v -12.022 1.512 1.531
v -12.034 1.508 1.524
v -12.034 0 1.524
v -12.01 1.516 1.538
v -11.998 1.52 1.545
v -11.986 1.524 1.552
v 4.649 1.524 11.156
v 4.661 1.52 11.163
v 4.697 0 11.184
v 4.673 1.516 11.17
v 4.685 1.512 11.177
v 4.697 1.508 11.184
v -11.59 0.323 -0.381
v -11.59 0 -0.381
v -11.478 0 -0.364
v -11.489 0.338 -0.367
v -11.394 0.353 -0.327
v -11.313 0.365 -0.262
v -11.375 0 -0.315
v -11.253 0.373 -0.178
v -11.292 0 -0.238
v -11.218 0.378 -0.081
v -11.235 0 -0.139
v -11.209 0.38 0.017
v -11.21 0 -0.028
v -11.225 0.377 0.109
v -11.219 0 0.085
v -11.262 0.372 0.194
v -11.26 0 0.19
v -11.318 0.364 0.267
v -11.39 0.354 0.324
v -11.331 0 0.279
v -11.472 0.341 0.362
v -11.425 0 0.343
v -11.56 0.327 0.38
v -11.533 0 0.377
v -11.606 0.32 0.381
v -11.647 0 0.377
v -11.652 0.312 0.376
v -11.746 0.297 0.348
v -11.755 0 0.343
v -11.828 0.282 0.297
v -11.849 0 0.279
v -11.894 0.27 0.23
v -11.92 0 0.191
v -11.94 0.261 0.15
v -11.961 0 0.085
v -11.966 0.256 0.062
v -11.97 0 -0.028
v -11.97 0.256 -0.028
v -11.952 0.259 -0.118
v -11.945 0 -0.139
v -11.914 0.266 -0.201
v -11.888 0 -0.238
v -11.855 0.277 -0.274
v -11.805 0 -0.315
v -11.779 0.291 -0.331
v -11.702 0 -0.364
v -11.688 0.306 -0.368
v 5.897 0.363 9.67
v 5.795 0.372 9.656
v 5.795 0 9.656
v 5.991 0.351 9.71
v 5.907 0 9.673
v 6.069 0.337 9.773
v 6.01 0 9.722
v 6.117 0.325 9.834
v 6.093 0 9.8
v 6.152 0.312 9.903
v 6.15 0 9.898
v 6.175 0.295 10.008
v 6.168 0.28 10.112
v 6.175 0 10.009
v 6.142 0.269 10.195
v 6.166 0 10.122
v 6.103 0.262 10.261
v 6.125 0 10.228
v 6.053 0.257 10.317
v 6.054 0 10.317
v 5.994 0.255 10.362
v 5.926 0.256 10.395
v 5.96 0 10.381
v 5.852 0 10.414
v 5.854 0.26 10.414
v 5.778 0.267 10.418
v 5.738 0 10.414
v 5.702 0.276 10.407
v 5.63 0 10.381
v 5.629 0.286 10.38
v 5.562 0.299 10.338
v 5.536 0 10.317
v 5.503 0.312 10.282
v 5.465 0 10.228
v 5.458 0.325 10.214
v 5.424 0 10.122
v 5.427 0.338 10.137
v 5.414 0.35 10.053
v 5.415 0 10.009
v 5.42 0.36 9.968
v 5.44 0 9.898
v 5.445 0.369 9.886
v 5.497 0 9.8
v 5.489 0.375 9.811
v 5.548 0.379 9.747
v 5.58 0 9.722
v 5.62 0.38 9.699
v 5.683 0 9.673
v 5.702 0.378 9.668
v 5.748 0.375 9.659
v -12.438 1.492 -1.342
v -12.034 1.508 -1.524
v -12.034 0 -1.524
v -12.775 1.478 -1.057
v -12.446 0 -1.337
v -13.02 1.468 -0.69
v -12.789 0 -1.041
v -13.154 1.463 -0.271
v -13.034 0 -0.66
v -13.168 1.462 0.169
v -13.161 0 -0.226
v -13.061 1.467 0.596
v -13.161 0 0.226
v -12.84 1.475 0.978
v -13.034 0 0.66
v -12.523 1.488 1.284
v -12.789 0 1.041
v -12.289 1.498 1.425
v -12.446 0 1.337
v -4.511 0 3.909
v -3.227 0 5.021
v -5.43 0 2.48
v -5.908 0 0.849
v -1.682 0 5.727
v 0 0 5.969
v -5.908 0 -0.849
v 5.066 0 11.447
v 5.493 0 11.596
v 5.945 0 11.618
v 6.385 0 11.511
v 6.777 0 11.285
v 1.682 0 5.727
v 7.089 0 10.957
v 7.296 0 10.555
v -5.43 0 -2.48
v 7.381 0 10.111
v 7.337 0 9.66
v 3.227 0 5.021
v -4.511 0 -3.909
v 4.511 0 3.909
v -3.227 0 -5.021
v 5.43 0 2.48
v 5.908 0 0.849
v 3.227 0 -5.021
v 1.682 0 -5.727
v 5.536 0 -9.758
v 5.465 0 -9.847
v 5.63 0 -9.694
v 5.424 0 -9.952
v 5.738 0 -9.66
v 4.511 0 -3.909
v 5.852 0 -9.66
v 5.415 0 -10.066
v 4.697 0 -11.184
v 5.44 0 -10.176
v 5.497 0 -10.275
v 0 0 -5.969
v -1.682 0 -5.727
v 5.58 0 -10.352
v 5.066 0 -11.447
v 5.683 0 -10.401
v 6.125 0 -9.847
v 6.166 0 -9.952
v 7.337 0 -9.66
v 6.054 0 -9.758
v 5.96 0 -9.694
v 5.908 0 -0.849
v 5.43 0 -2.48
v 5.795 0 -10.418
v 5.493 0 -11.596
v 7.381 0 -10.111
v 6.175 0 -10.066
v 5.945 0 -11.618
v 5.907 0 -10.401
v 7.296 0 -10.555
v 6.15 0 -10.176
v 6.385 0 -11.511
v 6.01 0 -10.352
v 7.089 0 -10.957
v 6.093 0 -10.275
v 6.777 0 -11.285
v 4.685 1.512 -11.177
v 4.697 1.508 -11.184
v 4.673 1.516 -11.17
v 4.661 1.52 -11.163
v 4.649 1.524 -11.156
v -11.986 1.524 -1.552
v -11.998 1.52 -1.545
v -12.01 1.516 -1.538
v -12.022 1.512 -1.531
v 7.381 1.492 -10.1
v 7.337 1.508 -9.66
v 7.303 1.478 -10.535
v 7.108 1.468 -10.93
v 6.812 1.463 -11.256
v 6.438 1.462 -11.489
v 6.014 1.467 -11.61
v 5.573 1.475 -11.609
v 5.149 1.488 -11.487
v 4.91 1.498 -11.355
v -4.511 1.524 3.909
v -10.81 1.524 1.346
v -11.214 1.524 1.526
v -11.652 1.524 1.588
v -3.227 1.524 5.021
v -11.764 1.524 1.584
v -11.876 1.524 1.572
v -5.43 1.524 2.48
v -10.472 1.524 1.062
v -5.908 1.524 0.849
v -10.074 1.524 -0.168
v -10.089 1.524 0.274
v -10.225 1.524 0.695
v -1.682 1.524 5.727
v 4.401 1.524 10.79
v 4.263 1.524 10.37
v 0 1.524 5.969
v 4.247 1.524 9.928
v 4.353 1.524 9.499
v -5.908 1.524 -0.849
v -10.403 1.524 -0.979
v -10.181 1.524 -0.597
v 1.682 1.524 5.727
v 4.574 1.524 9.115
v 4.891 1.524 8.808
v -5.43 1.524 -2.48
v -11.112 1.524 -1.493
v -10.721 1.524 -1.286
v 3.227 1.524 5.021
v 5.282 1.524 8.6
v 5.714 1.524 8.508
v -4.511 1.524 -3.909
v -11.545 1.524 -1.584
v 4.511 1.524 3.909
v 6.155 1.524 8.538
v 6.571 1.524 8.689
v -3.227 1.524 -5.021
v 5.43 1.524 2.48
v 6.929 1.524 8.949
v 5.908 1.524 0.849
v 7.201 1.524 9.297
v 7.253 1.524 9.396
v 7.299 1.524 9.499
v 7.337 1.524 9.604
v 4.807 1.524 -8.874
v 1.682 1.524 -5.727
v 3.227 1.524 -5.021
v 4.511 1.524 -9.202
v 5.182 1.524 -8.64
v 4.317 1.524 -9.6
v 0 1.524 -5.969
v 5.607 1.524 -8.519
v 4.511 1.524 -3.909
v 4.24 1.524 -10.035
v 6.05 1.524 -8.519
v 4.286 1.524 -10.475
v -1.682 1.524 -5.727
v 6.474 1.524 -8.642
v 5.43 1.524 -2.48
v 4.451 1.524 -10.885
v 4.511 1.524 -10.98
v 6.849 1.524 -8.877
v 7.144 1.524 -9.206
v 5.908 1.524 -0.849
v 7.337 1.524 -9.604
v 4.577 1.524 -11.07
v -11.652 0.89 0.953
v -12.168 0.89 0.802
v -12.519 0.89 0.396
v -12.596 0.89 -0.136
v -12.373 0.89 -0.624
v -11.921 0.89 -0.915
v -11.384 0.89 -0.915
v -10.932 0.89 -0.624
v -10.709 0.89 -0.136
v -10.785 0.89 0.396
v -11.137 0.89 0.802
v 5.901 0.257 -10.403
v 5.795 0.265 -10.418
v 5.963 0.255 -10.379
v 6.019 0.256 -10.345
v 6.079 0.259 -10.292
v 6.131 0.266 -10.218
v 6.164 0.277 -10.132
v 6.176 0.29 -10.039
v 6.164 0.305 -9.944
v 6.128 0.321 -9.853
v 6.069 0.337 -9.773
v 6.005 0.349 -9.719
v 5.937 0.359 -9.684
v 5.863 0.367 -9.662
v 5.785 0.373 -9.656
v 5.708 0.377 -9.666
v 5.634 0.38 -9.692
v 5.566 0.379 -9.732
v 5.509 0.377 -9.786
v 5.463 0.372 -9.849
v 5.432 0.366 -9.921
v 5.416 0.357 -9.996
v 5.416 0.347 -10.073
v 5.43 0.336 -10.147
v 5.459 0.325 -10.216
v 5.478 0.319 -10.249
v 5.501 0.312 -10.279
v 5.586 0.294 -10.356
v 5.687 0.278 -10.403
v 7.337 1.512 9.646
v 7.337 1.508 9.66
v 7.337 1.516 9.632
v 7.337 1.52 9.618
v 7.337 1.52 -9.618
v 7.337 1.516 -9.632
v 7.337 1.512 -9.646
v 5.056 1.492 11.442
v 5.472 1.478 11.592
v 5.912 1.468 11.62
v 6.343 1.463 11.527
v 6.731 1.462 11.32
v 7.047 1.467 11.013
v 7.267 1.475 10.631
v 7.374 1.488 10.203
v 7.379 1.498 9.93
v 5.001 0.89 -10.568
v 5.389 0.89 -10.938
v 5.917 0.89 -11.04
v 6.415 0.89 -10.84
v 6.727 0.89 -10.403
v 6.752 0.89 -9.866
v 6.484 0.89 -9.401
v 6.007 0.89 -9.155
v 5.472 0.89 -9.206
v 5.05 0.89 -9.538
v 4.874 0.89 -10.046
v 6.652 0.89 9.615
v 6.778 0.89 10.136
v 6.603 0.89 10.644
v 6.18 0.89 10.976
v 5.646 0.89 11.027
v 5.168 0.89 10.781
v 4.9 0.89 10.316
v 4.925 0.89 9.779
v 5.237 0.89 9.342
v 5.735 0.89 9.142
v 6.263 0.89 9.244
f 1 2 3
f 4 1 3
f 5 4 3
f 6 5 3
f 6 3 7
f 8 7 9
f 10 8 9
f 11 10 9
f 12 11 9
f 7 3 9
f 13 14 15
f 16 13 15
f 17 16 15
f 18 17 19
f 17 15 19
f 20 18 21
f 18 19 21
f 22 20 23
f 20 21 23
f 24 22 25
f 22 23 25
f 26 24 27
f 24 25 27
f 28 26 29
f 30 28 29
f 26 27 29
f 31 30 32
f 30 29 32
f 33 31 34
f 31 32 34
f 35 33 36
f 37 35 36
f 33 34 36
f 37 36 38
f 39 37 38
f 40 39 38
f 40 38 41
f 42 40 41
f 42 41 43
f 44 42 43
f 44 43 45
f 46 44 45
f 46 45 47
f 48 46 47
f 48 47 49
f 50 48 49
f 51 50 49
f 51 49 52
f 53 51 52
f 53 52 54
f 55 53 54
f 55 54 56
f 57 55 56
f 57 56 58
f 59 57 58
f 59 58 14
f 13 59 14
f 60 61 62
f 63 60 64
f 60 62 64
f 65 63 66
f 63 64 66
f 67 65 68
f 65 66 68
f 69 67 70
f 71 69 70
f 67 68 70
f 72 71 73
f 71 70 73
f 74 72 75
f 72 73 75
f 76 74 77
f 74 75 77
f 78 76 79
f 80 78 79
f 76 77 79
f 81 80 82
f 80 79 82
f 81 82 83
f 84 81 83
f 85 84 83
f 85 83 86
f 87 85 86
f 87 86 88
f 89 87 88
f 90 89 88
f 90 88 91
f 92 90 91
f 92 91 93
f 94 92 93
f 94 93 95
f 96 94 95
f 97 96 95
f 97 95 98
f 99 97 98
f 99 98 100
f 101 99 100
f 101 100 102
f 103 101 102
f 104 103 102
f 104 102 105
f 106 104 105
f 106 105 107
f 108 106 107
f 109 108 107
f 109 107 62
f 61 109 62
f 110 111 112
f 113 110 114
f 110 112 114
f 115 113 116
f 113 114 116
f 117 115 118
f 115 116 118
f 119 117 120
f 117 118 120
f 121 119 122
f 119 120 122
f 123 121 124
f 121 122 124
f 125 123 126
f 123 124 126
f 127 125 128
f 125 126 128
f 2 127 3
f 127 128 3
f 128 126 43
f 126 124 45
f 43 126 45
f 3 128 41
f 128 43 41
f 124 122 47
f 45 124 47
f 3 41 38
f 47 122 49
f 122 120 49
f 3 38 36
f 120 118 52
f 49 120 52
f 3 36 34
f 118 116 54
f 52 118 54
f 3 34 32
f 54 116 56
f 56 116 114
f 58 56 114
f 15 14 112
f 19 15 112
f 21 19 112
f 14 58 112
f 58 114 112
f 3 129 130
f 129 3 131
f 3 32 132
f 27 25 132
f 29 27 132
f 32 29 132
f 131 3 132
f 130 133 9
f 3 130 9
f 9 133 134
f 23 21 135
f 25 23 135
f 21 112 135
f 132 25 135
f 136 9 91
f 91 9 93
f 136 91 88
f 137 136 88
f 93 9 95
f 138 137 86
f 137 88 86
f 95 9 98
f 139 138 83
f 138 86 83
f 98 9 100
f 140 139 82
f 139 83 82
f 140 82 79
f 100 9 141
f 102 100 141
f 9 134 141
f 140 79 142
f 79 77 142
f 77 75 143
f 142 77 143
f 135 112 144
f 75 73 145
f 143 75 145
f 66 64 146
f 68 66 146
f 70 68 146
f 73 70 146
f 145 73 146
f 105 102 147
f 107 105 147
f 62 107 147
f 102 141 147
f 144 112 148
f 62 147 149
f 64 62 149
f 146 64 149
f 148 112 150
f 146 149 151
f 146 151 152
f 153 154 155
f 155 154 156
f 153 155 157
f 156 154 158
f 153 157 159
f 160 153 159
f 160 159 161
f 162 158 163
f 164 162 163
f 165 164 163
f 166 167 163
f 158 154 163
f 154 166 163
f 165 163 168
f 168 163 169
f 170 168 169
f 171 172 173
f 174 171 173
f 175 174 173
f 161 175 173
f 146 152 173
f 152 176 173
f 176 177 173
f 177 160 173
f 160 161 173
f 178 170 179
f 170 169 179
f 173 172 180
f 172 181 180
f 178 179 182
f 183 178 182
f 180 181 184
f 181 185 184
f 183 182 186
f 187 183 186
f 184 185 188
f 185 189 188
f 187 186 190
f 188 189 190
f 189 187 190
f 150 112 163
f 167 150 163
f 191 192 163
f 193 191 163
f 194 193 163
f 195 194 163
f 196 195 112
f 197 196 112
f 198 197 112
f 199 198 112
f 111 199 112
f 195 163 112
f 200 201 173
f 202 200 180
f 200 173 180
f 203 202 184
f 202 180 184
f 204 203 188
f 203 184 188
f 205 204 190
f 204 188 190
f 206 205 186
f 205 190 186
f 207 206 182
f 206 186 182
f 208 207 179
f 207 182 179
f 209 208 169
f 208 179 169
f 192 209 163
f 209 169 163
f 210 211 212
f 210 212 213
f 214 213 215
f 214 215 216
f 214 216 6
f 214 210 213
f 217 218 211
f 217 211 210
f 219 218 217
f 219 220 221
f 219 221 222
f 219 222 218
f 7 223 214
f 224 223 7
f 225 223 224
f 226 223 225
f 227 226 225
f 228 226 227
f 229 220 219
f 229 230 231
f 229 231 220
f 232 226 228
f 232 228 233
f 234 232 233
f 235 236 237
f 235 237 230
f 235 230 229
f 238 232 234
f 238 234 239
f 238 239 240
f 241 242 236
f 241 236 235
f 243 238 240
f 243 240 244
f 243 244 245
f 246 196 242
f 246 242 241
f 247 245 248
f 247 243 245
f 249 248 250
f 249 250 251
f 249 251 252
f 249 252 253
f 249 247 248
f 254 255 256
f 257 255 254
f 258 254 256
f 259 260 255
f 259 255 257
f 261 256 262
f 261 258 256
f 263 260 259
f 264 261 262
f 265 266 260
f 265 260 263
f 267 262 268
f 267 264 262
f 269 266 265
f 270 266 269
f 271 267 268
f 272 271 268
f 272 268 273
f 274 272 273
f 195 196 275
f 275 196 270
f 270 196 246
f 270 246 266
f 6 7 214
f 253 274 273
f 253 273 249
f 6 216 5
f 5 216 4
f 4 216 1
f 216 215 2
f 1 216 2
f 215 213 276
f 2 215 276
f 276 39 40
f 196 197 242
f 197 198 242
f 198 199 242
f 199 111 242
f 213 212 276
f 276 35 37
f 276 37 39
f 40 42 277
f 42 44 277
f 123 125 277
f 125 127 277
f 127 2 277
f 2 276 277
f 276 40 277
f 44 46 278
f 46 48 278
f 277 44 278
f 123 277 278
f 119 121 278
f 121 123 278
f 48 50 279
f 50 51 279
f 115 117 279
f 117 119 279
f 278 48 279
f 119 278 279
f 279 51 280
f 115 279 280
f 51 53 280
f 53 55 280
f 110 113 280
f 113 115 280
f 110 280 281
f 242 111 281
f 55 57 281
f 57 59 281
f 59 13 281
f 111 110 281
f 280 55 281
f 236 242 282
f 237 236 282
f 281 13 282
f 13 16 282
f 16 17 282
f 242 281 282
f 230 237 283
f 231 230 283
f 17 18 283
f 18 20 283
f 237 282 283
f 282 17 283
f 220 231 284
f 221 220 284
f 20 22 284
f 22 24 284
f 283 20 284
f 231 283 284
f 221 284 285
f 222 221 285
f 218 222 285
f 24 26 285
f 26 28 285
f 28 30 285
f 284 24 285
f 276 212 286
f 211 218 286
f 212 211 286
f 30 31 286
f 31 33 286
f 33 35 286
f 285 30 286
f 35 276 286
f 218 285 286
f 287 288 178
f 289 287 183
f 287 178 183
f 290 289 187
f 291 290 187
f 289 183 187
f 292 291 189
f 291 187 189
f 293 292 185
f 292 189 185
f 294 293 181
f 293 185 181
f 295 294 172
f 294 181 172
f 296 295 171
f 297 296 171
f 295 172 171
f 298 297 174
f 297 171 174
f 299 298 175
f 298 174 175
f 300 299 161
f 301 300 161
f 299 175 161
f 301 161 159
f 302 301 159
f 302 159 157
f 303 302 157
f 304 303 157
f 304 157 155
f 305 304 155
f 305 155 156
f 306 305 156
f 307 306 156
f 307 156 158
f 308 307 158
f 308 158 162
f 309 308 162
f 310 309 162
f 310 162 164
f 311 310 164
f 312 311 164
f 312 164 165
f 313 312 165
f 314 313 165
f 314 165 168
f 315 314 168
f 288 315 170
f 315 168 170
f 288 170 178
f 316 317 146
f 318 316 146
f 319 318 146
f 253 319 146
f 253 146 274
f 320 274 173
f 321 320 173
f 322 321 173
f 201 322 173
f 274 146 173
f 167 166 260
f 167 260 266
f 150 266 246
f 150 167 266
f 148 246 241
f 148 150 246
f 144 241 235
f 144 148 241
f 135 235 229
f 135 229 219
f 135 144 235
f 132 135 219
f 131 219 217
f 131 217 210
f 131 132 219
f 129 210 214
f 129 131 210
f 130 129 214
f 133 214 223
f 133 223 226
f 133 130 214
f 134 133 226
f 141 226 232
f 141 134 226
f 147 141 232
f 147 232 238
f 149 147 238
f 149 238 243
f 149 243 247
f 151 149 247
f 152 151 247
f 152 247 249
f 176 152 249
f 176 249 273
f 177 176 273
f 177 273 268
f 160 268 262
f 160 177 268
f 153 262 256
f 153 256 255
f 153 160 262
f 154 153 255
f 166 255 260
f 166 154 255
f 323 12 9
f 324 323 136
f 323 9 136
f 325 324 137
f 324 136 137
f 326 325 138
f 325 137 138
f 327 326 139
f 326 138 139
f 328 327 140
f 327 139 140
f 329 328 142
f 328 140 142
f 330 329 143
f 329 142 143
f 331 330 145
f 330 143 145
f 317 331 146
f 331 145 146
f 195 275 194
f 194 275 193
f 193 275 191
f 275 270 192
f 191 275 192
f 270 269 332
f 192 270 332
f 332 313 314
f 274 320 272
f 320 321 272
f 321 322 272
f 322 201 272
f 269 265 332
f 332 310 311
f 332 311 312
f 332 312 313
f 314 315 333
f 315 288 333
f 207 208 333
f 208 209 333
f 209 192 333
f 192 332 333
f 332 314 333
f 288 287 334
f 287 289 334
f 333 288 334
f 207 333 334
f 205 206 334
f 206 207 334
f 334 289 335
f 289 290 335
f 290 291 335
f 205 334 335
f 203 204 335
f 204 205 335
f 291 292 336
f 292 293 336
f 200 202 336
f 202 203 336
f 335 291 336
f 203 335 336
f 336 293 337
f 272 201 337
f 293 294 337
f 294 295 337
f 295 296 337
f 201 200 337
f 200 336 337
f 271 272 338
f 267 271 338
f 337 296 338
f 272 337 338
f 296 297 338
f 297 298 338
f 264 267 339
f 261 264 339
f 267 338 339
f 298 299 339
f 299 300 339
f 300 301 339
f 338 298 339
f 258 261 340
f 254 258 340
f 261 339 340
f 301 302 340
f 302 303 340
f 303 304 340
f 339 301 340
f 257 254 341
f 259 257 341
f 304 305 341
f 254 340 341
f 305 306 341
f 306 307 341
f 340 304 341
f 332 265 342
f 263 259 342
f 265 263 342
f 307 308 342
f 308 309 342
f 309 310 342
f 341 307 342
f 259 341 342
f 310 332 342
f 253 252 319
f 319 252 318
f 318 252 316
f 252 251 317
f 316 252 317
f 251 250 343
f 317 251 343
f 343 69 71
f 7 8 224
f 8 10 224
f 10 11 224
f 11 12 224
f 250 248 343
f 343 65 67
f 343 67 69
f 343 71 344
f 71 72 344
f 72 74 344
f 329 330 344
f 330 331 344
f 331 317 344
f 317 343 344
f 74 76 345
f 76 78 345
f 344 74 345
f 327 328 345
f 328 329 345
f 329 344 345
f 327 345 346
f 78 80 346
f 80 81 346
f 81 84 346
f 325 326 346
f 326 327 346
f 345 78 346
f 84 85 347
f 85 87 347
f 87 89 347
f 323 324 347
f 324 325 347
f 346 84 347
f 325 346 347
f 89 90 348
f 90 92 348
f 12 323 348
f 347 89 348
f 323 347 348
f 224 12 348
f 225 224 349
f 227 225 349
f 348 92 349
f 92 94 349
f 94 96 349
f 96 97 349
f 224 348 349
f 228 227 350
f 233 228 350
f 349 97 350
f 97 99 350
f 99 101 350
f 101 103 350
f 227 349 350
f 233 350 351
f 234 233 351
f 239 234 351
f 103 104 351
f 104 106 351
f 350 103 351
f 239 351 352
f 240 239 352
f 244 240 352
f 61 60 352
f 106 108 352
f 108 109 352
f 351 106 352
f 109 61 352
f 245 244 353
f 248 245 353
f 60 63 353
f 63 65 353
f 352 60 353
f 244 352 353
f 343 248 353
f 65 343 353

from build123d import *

# Parameters (mm, degrees)
SKETCH1_R           = 5.969
BOSS_EXTRUDE1_DEPTH = 1.524
CIRPATTERN1_COUNT   = 3
SKETCH4_R           = 0.381
CUT_EXTRUDE2_DEPTH  = 12.7


with BuildPart() as part:
    # Sketch1 → Boss-Extrude1 (new body)
    with BuildSketch(Plane(origin=(0, 0, 0), x_dir=(1, 0, 0), z_dir=(0, 1, 0))):
        with BuildLine():
            Line((-12.0345, -1.524), (4.697427285, -11.184182722))
            ThreePointArc((4.697427285, -11.184182722), (6.58875, -11.412049758), (7.337072715, -9.660182722))
            Line((7.337072715, -9.660182722), (7.337072715, 9.660182722))
            ThreePointArc((7.337072715, 9.660182722), (6.58875, 11.412049758), (4.697427285, 11.184182722))
            Line((4.697427285, 11.184182722), (-12.0345, 1.524))
            ThreePointArc((-12.0345, 1.524), (-13.1775, 0), (-12.0345, -1.524))
        make_face()
        with Locations(Location((0, 0, 0), (0, 0, 90))):
            Circle(SKETCH1_R, mode=Mode.SUBTRACT)
    extrude(amount=BOSS_EXTRUDE1_DEPTH)

    # Cut-Extrude1 cone 1 section (through the dimple's axis) → Cut-Extrude1 (revolve, cut)
    with BuildSketch(Plane(origin=(-11.65220136, 1.524, 0), x_dir=(0, 0, 1), z_dir=(1, 0, 0))):
        Polygon((0, 0), (1.5875, 0), (0, 1.5875), align=None)
    cut_extrude1 = revolve(axis=Axis((-11.65220136, 1.524, 0), (0, -1, 0)), mode=Mode.SUBTRACT)

    # CirPattern1: Cut-Extrude1 ×3 about axis
    cirpattern1_axis = Axis((0, 0, 0), (0, 1, 0))
    for i in range(1, CIRPATTERN1_COUNT):
        add(cut_extrude1.rotate(cirpattern1_axis, i * 360 / CIRPATTERN1_COUNT), mode=Mode.SUBTRACT)

    # Sketch4 → Cut-Extrude2 (cut)
    with BuildSketch(Plane.XZ):
        with Locations(Location((5.795, -10.03723443, 0), (0, 0, 270))):
            Circle(SKETCH4_R)
        with Locations(Location((-11.59, 0, 0), (0, 0, 270))):
            Circle(SKETCH4_R)
        with Locations(Location((5.795, 10.03723443, 0), (0, 0, 270))):
            Circle(SKETCH4_R)
    extrude(amount=-CUT_EXTRUDE2_DEPTH, mode=Mode.SUBTRACT)


solid = part.part
